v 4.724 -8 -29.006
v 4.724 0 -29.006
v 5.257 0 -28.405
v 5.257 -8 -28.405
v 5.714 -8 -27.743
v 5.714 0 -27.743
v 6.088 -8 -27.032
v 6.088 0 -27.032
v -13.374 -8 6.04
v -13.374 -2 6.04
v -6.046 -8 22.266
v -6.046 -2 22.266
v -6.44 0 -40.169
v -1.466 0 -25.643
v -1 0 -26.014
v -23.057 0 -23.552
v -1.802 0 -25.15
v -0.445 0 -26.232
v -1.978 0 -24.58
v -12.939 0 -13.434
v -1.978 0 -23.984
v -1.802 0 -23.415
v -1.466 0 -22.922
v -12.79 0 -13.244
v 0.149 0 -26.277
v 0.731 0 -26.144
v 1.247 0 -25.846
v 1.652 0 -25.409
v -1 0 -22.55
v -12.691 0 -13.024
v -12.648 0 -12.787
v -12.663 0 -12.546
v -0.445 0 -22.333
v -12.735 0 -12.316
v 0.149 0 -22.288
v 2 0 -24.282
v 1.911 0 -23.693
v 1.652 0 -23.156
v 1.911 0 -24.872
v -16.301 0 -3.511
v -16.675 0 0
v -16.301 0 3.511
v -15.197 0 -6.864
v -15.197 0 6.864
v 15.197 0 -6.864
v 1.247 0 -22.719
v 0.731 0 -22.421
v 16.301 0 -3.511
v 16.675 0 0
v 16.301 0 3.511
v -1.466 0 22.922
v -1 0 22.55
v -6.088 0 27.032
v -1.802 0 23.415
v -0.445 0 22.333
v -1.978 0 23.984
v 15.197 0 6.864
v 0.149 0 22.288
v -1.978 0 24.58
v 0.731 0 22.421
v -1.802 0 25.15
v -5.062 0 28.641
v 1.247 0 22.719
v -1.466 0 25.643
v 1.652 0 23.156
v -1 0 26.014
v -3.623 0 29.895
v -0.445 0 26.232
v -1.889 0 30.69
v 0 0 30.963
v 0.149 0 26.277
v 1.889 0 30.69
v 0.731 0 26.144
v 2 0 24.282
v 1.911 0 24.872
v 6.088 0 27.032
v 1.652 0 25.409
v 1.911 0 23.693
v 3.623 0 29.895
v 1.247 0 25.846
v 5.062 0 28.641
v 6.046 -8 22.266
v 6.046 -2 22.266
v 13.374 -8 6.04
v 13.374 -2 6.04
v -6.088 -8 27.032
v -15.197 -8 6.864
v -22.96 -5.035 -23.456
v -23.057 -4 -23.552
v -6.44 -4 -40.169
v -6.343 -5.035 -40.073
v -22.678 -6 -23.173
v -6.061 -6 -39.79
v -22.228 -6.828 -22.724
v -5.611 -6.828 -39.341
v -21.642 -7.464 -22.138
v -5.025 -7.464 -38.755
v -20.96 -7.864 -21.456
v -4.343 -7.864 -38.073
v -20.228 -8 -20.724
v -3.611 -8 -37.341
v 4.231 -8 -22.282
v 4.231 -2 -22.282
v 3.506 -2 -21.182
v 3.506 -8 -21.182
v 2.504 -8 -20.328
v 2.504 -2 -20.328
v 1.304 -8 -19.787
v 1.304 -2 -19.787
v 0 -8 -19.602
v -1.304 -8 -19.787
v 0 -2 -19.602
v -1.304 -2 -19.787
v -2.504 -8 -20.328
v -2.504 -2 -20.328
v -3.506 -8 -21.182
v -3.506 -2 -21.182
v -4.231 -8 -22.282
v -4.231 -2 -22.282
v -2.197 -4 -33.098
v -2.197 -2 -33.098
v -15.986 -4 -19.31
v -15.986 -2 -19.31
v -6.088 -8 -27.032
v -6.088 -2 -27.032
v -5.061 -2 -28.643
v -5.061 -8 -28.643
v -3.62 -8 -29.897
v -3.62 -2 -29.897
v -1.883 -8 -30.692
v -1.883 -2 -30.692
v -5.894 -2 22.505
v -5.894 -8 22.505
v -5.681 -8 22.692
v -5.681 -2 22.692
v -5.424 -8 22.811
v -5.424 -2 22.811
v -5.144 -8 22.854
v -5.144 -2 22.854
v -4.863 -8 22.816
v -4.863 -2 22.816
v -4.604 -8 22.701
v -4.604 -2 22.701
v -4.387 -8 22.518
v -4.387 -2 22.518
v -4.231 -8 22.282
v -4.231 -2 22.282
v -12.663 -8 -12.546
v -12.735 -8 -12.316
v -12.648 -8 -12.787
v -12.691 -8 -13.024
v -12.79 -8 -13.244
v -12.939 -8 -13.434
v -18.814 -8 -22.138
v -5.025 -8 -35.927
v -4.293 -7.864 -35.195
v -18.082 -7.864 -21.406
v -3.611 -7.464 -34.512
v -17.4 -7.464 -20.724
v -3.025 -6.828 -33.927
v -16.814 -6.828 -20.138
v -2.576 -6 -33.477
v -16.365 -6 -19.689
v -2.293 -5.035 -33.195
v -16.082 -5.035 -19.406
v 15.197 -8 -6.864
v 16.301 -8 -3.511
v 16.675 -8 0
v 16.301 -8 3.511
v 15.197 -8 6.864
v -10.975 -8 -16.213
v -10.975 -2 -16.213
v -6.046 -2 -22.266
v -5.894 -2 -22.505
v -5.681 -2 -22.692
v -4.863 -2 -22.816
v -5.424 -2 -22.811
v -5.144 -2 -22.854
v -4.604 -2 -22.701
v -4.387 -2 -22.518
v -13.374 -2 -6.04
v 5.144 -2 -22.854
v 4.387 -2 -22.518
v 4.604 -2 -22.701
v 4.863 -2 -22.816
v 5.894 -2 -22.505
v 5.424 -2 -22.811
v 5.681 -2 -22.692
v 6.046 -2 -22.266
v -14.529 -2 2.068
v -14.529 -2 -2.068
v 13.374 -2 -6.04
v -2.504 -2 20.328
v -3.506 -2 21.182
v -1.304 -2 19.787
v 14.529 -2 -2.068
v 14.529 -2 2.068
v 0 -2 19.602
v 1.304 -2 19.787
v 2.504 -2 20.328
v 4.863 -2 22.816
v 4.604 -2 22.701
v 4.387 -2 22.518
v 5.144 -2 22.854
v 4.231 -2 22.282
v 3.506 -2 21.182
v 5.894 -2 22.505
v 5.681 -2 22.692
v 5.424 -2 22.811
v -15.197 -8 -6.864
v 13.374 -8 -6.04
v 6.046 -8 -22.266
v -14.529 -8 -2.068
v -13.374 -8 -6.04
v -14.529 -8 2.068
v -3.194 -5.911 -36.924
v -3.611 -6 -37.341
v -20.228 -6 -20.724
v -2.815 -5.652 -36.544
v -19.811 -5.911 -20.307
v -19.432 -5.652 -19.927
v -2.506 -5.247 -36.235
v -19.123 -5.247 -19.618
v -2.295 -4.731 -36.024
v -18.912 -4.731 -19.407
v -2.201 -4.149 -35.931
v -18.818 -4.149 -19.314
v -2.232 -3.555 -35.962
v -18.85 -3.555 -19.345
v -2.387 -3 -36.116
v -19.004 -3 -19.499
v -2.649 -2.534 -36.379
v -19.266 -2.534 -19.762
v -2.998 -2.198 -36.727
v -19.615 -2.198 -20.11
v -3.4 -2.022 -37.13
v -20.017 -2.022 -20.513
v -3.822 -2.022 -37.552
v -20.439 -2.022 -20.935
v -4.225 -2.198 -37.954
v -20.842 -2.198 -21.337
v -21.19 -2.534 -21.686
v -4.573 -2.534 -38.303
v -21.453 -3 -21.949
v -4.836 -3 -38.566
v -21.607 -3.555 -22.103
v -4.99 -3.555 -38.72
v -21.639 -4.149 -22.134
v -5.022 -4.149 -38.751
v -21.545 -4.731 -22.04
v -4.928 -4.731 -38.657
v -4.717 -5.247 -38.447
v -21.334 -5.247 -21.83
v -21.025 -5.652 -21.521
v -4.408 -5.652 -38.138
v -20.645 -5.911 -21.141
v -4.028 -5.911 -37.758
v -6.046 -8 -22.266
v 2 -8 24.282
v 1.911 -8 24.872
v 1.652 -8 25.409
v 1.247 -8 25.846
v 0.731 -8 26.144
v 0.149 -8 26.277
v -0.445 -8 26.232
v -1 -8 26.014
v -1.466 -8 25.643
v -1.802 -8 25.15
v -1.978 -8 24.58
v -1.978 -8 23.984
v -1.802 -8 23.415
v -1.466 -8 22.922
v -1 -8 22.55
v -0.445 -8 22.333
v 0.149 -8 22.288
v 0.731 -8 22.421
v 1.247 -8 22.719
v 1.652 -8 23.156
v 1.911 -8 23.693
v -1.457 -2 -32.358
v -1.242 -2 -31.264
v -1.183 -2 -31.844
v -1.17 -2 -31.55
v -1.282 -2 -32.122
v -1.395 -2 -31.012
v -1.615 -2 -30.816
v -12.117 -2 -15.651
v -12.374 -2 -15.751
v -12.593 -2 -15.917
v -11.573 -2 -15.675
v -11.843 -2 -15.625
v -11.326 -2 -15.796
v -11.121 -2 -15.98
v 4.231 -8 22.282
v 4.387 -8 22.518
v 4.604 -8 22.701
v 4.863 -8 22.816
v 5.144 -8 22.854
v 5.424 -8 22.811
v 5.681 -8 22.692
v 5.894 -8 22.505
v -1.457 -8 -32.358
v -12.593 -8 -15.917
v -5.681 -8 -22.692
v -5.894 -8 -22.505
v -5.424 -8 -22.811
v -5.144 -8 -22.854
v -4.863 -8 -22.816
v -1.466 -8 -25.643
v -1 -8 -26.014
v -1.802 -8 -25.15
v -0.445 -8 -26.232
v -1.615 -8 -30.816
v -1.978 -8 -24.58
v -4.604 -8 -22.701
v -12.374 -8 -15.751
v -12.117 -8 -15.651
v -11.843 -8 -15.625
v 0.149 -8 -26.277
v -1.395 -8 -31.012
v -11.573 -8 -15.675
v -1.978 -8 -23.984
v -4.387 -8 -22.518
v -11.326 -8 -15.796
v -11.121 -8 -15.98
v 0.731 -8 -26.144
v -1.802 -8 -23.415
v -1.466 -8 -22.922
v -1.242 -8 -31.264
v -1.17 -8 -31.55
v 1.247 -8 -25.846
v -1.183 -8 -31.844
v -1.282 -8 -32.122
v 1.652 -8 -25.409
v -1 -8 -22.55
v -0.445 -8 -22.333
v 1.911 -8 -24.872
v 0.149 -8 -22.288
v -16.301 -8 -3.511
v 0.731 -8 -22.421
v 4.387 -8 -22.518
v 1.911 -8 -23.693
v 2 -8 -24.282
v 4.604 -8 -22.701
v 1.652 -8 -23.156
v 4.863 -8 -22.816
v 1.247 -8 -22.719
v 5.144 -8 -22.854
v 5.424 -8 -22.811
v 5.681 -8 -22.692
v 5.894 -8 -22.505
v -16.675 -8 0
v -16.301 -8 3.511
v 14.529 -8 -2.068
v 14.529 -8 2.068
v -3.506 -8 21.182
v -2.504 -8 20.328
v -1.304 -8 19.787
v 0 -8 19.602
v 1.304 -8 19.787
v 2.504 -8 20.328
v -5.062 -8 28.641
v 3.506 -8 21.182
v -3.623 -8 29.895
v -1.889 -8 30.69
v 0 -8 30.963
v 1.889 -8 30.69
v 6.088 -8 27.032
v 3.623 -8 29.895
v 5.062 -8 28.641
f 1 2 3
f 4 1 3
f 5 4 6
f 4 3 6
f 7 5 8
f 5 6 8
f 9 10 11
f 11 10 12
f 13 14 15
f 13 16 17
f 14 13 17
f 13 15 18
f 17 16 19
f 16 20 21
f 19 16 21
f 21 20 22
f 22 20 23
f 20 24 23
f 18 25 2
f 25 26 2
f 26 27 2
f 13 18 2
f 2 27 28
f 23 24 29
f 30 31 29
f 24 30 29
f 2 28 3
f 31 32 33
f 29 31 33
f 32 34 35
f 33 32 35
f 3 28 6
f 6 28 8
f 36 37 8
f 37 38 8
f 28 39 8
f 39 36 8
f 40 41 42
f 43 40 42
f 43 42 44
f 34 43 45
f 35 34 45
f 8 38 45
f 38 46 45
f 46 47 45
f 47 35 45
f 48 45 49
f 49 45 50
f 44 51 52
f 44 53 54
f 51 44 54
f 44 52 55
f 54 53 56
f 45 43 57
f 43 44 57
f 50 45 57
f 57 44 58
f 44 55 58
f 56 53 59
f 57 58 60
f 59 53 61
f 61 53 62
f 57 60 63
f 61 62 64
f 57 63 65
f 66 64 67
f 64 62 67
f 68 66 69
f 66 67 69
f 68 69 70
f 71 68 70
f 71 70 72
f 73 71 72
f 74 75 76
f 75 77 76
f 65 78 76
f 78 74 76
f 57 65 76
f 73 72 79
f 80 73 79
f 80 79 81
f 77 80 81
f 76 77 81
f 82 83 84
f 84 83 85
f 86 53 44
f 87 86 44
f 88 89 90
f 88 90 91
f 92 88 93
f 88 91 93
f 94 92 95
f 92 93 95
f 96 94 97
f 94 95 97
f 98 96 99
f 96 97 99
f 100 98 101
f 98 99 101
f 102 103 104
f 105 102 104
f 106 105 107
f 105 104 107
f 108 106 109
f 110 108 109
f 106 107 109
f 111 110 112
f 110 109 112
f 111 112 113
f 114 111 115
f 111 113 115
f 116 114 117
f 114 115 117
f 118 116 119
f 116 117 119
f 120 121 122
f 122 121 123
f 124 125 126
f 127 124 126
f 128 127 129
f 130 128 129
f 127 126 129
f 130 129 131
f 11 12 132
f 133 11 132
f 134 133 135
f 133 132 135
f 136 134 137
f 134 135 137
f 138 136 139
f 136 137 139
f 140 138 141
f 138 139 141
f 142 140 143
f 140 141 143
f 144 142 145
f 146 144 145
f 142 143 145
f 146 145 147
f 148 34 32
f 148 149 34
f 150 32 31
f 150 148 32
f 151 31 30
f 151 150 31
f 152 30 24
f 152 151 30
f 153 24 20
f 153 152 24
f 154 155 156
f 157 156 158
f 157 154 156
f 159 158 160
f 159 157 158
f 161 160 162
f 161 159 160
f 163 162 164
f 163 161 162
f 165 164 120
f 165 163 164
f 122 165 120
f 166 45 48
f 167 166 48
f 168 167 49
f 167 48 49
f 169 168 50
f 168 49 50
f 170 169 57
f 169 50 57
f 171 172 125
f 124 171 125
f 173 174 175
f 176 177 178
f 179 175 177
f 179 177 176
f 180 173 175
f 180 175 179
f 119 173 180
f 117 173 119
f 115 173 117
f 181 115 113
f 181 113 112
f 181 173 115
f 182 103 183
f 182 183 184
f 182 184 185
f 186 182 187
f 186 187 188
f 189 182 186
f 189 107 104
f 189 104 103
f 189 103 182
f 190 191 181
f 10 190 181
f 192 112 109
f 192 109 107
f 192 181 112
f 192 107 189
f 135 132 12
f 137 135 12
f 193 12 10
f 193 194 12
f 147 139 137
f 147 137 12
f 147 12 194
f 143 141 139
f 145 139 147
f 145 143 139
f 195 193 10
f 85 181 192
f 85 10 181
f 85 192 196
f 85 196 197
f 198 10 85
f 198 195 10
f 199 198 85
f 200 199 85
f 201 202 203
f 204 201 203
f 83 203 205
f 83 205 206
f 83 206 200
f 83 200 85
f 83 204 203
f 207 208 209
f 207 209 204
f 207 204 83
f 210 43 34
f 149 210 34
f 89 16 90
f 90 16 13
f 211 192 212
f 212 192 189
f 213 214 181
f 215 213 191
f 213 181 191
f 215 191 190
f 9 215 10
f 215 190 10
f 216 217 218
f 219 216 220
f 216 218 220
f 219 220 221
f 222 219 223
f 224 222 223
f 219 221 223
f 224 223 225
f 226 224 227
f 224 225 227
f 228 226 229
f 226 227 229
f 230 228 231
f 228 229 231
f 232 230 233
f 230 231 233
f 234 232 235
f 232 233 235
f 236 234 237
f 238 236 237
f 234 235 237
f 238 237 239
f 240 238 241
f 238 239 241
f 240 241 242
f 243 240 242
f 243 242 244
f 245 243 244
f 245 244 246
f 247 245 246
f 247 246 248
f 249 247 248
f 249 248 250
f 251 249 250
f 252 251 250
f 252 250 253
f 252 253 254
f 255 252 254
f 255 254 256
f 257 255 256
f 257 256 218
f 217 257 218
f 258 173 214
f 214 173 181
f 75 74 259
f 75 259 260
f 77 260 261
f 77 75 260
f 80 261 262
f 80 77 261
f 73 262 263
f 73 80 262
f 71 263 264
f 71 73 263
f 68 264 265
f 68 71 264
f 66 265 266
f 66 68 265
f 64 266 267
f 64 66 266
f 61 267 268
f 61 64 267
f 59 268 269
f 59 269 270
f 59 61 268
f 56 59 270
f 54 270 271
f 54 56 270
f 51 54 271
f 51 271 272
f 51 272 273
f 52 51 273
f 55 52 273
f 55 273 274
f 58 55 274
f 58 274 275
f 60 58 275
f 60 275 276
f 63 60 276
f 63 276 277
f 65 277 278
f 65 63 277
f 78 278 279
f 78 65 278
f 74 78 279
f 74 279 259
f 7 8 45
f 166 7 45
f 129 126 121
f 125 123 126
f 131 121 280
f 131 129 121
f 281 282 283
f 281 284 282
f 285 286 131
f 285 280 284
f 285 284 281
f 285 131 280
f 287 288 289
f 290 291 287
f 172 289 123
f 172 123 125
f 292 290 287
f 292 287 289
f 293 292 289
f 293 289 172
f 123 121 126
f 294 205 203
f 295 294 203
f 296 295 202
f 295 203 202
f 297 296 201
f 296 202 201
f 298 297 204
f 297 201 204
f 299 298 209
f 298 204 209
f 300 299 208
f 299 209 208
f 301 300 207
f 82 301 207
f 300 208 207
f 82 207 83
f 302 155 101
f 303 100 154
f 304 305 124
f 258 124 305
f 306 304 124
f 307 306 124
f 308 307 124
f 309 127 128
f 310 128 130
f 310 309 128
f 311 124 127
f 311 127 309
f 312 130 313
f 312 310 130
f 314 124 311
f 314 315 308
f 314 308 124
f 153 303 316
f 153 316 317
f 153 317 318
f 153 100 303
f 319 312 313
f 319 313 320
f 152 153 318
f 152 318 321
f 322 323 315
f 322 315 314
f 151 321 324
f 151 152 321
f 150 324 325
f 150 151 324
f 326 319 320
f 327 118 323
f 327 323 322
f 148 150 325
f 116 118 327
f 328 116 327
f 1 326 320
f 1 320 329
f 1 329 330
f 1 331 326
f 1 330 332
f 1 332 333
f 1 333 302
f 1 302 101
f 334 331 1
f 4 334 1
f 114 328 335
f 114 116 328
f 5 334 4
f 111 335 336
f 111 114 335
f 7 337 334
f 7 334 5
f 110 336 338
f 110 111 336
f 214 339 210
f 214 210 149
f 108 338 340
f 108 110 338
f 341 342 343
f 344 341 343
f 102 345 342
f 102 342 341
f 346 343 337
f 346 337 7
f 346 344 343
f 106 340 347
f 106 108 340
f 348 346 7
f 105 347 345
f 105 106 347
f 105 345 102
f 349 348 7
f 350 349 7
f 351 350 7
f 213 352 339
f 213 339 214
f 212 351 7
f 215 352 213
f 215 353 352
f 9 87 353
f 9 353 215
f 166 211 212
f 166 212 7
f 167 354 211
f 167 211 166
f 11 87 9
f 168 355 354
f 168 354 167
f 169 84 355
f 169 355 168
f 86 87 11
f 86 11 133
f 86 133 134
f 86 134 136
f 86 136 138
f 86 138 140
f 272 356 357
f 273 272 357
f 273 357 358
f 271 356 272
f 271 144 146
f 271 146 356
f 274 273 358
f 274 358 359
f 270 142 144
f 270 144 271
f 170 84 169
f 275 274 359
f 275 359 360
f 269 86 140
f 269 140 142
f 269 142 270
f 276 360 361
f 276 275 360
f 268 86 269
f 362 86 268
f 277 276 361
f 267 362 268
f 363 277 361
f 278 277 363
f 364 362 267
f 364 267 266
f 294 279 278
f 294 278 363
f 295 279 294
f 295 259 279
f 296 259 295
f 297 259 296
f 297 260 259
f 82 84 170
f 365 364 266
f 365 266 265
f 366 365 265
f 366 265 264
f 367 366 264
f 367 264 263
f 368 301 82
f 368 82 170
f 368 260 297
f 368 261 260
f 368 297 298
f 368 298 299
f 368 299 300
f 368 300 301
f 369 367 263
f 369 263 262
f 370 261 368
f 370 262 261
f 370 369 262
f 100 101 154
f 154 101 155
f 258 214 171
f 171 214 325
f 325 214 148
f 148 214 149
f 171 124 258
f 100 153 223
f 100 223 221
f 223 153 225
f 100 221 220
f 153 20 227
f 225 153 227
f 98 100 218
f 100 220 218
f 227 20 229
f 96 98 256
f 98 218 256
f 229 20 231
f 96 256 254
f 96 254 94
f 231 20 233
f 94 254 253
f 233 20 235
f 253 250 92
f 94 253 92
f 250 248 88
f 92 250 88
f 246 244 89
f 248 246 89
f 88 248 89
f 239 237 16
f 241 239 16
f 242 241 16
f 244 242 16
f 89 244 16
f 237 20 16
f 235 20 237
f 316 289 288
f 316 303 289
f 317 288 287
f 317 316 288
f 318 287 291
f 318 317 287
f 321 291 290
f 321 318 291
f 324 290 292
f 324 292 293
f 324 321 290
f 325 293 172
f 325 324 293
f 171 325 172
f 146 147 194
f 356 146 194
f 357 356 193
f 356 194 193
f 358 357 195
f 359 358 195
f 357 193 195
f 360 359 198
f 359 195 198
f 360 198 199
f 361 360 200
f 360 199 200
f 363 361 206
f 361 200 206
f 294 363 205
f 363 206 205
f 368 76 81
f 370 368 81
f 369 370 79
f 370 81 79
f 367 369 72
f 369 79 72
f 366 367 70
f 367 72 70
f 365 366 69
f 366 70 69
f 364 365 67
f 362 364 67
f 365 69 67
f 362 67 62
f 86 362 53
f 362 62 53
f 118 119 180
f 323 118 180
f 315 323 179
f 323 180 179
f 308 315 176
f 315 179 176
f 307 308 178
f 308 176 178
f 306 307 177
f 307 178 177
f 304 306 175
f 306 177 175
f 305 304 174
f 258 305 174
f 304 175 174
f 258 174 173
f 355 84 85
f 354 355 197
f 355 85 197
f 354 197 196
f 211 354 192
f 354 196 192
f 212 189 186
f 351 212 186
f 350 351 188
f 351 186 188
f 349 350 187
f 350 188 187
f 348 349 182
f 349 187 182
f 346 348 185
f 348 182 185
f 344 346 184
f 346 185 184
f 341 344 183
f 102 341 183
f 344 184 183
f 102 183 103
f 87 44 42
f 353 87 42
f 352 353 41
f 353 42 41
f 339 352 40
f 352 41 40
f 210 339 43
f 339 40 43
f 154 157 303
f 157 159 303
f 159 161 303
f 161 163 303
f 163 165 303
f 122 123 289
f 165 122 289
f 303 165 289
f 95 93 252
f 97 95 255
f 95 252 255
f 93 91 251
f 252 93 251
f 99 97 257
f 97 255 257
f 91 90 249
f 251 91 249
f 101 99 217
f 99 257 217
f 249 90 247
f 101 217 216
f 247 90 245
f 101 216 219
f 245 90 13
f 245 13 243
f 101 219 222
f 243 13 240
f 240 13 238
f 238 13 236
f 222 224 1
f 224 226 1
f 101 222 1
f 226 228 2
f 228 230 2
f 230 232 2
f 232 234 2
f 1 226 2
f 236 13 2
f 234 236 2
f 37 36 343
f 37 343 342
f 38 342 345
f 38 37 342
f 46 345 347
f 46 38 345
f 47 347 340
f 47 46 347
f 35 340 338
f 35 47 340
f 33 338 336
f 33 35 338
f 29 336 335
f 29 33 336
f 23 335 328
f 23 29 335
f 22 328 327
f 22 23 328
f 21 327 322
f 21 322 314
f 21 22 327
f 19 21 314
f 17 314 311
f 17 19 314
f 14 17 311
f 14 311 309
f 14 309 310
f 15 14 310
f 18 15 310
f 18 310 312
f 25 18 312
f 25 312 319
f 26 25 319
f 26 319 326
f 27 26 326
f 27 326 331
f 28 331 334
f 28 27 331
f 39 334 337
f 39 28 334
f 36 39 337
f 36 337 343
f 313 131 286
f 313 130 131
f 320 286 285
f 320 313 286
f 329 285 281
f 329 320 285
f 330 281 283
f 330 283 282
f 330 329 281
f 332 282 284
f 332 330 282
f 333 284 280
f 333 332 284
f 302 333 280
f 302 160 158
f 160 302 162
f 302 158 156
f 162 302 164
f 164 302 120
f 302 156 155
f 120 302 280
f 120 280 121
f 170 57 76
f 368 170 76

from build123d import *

# Parameters (mm, degrees)
F0_R     = 2
F1_DEPTH = 8
F2_DEPTH = 2
F3_R     = 1
F5_D     = 4
F6_R     = 3.99999


# Not quite as in the source:
# - a fillet or chamfer is up to 0.001 mm smaller than in the source, because OpenCascade refuses the exact size


with BuildPart() as f1:
    # F0 (on Front) → F1 (new body)
    with BuildSketch(Plane.XZ):
        with BuildLine():
            Line((15.1970139668, 6.8636525628), (6.0880650012, 27.0320429916))
            ThreePointArc((6.0880650012, 27.0320429916), (0, 30.9626), (-6.0880650012, 27.0320429916))
            Line((-6.0880650012, 27.0320429916), (-15.1970139668, 6.8636525628))
            ThreePointArc((-15.1970139668, 6.8636525628), (-16.6751, 0), (-15.1970139668, -6.8636525628))
            Line((-15.1970139668, -6.8636525628), (-12.4500889322, -12.9456996558))
            Line((-12.4500889322, -12.9456996558), (-11.570090993, -14.8941288413))
            Line((-11.570090993, -14.8941288413), (-6.0880650012, -27.0320429916))
            ThreePointArc((-6.0880650012, -27.0320429916), (-3.6489564687, -29.8779507977), (-0.0611180905, -30.9623204051))
            ThreePointArc((-0.0611180905, -30.9623204051), (2.5281419438, -30.4657300374), (4.7236147197, -29.0060147197))
            ThreePointArc((4.7236147197, -29.0060147197), (5.4952020611, -28.0807978659), (6.0880650012, -27.0320429916))
            Line((6.0880650012, -27.0320429916), (15.1970139668, -6.8636525628))
            ThreePointArc((15.1970139668, -6.8636525628), (16.6751, 0), (15.1970139668, 6.8636525628))
        make_face()
        with Locations((0, -24.2824)):
            Circle(F0_R, mode=Mode.SUBTRACT)
        with BuildLine():
            Line((-13.3742945868, 6.0404308054), (-6.0462846285, 22.2655920687))
            ThreePointArc((-6.0462846285, 22.2655920687), (-5.1436901116, 22.8539427752), (-4.2309206889, 22.2815046593))
            ThreePointArc((-4.2309206889, 22.2815046593), (0, 19.6022), (4.2309206889, 22.2815046593))
            ThreePointArc((4.2309206889, 22.2815046593), (5.1436901116, 22.8539427752), (6.0462846285, 22.2655920687))
            Line((6.0462846285, 22.2655920687), (13.3742945868, 6.0404308054))
            ThreePointArc((13.3742945868, 6.0404308054), (14.6751, 0), (13.3742945868, -6.0404308054))
            Line((13.3742945868, -6.0404308054), (6.0462846285, -22.2655920687))
            ThreePointArc((6.0462846285, -22.2655920687), (5.1436901116, -22.8539427752), (4.2309206889, -22.2815046593))
            ThreePointArc((4.2309206889, -22.2815046593), (0, -19.6022), (-4.2309206889, -22.2815046593))
            ThreePointArc((-4.2309206889, -22.2815046593), (-5.1436901116, -22.8539427752), (-6.0462846285, -22.2655920687))
            Line((-6.0462846285, -22.2655920687), (-13.3742945868, -6.0404308054))
            ThreePointArc((-13.3742945868, -6.0404308054), (-14.6751, 0), (-13.3742945868, 6.0404308054))
        make_face(mode=Mode.SUBTRACT)
        with Locations((0, 24.2824)):
            Circle(F0_R, mode=Mode.SUBTRACT)
        with BuildLine():
            Line((-11.570090993, -14.8941288413), (-12.4500889322, -12.9456996558))
            Line((-12.4500889322, -12.9456996558), (-23.05669065, -23.5523013736))
            Line((-23.05669065, -23.5523013736), (-6.4396812921, -40.1693107315))
            Line((-6.4396812921, -40.1693107315), (4.7236147197, -29.0060147197))
            ThreePointArc((4.7236147197, -29.0060147197), (2.5281419438, -30.4657300374), (-0.0611180905, -30.9623204051))
            Line((-0.0611180905, -30.9623204051), (-2.197040605, -33.0982429196))
            Line((-2.197040605, -33.0982429196), (-15.9856228381, -19.3096606865))
            Line((-15.9856228381, -19.3096606865), (-11.570090993, -14.8941288413))
        make_face()
    extrude(amount=F1_DEPTH)

    # F0 (on Front) → F2 (join)
    with BuildSketch(Plane.XZ):
        with BuildLine():
            ThreePointArc((-4.2309206889, 22.2815046593), (-5.1436901116, 22.8539427752), (-6.0462846285, 22.2655920687))
            Line((-6.0462846285, 22.2655920687), (-13.3742945868, 6.0404308054))
            ThreePointArc((-13.3742945868, 6.0404308054), (-14.6751, 0), (-13.3742945868, -6.0404308054))
            Line((-13.3742945868, -6.0404308054), (-6.0462846285, -22.2655920687))
            ThreePointArc((-6.0462846285, -22.2655920687), (-5.1436901116, -22.8539427752), (-4.2309206889, -22.2815046593))
            ThreePointArc((-4.2309206889, -22.2815046593), (0, -19.6022), (4.2309206889, -22.2815046593))
            ThreePointArc((4.2309206889, -22.2815046593), (5.1436901116, -22.8539427752), (6.0462846285, -22.2655920687))
            Line((6.0462846285, -22.2655920687), (13.3742945868, -6.0404308054))
            ThreePointArc((13.3742945868, -6.0404308054), (14.6751, 0), (13.3742945868, 6.0404308054))
            Line((13.3742945868, 6.0404308054), (6.0462846285, 22.2655920687))
            ThreePointArc((6.0462846285, 22.2655920687), (5.1436901116, 22.8539427752), (4.2309206889, 22.2815046593))
            ThreePointArc((4.2309206889, 22.2815046593), (0, 19.6022), (-4.2309206889, 22.2815046593))
        make_face()
        with BuildLine():
            Line((-6.0880650012, -27.0320429916), (-11.570090993, -14.8941288413))
            Line((-11.570090993, -14.8941288413), (-15.9856228381, -19.3096606865))
            Line((-15.9856228381, -19.3096606865), (-2.197040605, -33.0982429196))
            Line((-2.197040605, -33.0982429196), (-0.0611180905, -30.9623204051))
            ThreePointArc((-0.0611180905, -30.9623204051), (-3.6489564687, -29.8779507977), (-6.0880650012, -27.0320429916))
        make_face()
    extrude(amount=F2_DEPTH)

    # F3
    f3_edges = [f1.edges().sort_by_distance(p)[0] for p in [
        (-12.450089, -4, -12.9457),
        (-11.570091, -5, -14.894129),
        (-0.061118, -5, -30.96232),
    ]]
    fillet(f3_edges, radius=F3_R)

    # F5 (through all)
    with Locations(Plane(origin=(16.8648147197, 0, -16.8648147197), x_dir=(0, 1, 0), z_dir=(0.7071067812, 0, -0.7071067812))):
        with Locations((-4, -28.9575343242)):
            Hole(F5_D / 2)

    # F6 (radius 4 in the source; OpenCascade refuses exactly that, so slightly less here)
    f6_edges = [f1.edges().sort_by_distance(p)[0] for p in [
        (-14.748186, -8, -31.860806),
        (-9.091332, -8, -26.203952),
    ]]
    fillet(f6_edges, radius=F6_R)


solid = f1.part
